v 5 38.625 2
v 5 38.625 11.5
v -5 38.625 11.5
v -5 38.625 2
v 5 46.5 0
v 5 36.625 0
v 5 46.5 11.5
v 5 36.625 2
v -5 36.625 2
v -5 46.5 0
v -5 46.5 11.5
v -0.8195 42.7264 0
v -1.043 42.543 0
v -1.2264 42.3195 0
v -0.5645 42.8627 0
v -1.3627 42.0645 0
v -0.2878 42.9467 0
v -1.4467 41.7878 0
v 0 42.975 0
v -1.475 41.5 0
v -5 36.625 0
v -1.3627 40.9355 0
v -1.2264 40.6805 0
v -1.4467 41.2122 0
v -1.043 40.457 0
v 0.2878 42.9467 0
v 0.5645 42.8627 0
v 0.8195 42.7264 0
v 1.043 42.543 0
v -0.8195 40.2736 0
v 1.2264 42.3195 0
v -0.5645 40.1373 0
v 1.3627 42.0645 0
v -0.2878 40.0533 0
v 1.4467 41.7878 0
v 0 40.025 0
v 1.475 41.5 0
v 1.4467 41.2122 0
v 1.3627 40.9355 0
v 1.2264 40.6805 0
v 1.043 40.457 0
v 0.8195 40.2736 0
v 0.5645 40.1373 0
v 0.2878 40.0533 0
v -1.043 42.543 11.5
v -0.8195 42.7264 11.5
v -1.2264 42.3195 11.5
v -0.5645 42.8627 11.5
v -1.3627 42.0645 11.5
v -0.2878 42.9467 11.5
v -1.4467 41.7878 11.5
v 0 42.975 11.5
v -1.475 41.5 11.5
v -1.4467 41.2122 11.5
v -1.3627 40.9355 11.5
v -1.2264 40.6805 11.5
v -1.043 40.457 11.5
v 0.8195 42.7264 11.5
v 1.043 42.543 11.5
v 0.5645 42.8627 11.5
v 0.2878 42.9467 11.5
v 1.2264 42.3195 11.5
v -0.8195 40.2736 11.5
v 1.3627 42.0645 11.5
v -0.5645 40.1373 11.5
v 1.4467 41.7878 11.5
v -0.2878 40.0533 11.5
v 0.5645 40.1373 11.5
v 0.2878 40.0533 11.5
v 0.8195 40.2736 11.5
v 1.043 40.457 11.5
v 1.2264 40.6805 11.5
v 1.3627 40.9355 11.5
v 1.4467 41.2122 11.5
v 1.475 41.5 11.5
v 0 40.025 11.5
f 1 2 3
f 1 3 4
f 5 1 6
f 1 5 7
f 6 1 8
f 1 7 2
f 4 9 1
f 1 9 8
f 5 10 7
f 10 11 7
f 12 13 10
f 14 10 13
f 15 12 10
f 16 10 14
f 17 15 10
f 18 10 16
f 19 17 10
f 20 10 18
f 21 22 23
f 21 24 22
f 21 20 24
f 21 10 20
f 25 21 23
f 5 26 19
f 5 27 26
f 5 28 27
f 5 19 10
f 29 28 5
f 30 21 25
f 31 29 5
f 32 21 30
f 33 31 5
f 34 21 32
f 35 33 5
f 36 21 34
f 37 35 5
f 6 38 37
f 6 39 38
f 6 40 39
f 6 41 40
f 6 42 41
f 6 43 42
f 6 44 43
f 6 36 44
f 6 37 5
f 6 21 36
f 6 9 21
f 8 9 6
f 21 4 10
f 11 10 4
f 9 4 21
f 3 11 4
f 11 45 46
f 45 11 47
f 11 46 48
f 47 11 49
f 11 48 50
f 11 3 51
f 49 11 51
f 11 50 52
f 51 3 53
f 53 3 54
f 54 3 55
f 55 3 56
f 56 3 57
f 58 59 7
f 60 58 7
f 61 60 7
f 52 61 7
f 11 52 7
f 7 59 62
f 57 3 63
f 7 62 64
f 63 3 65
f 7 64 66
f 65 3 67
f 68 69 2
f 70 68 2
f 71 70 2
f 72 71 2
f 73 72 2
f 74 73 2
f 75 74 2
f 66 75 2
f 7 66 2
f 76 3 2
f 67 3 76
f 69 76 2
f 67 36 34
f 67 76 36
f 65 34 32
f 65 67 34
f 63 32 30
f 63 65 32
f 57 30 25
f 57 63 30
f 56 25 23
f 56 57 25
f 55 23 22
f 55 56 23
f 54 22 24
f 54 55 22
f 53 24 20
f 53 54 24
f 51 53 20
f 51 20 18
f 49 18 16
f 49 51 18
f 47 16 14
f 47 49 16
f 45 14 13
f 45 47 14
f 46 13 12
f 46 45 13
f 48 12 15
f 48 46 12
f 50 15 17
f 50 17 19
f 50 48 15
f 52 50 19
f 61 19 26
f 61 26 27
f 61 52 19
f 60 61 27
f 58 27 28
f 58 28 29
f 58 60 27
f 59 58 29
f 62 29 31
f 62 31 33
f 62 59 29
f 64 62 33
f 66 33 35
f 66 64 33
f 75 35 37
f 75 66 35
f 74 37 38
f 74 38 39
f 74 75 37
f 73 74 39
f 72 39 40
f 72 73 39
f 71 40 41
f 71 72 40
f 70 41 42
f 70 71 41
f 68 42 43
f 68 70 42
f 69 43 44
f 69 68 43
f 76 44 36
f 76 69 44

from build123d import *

# Parameters (mm, degrees)
SKETCH1_W                    = 10
SKETCH1_H                    = 70
BOSS_EXTRUDE1_DEPTH          = 9.5
SKETCH2_W                    = 54.25
SKETCH2_H                    = 9.5
CUT_EXTRUDE1_DEPTH           = 38.619808612
SKETCH3_R                    = 1.475
CUT_EXTRUDE2_DEPTH           = 37.609425016
SKETCH4_W                    = 10
SKETCH4_H                    = 9.875
SKETCH4_R                    = 1.475
BOSS_EXTRUDE2_DEPTH          = 2
BODY_DELETE_KEEP_2_OUTLINE_W = 10
BODY_DELETE_KEEP_2_OUTLINE_H = 9.875
BODY_DELETE_KEEP_2_OUTLINE_R = 1.475
BODY_DELETE_KEEP_2_DEPTH     = 11.5
BODY_MOVE_COPY1_ANGLE        = 90


with BuildPart() as part:
    # Sketch1 → Boss-Extrude1 (new body)
    with BuildSketch(Plane(origin=(0, 0, 0), x_dir=(1, 0, 0), z_dir=(0, 1, 0))):
        Rectangle(SKETCH1_W, SKETCH1_H)
    extrude(amount=BOSS_EXTRUDE1_DEPTH)

    # Sketch2 → Cut-Extrude1 (cut, through all)
    with BuildSketch(Plane(origin=(5, 0, 0), x_dir=(0, 0, -1), z_dir=(1, 0, 0))):
        with Locations((0, 4.75)):
            Rectangle(SKETCH2_W, SKETCH2_H)
    extrude(amount=-CUT_EXTRUDE1_DEPTH, mode=Mode.SUBTRACT)


with BuildPart() as cut_extrude1_piece_1:
    # of the separate pieces the step leaves, piece 1, a body of its own (cut_extrude1_pieces)
    add(part.part.solids().sort_by_distance((-5, 0, 35))[0])


with BuildPart() as cut_extrude1_piece_2:
    # of the separate pieces the step leaves, piece 2, a body of its own (cut_extrude1_pieces)
    add(part.part.solids().sort_by_distance((-5, 0, -35))[0])


with BuildPart() as cut_extrude2_tool:
    # Sketch3 → Cut-Extrude2 (new, through all)
    with BuildSketch(Plane.XZ):
        with Locations(Location((0, 30, 0), (0, 0, 270))):
            Circle(SKETCH3_R)
        with Locations(Location((0, -30, 0), (0, 0, 270))):
            Circle(SKETCH3_R)
    extrude(amount=-CUT_EXTRUDE2_DEPTH)


with BuildPart() as cut_extrude1_piece_1_1:
    add(cut_extrude1_piece_1.part)

    # Cut-Extrude2: cut by cut_extrude2_tool
    add(cut_extrude2_tool.part, mode=Mode.SUBTRACT)



with BuildPart() as cut_extrude1_piece_2_1:
    add(cut_extrude1_piece_2.part)

    # Cut-Extrude2: cut by cut_extrude2_tool
    add(cut_extrude2_tool.part, mode=Mode.SUBTRACT)


with BuildPart() as cut_extrude1_piece_1_2:
    add(cut_extrude1_piece_1_1.part)

    add(cut_extrude1_piece_2_1.part)  # Boss-Extrude2 merges Cut-Extrude1 piece 2
    # Sketch4 → Boss-Extrude2 (add)
    # profile 1 of 2: a face of its own
    with BuildSketch(Plane(origin=(0, 9.5, 0), x_dir=(1, 0, 0), z_dir=(0, 1, 0))):
        with Locations((0, -30.0625)):
            Rectangle(SKETCH4_W, SKETCH4_H)
        with Locations(Location((0, -30, 0), (0, 0, 90))):
            Circle(SKETCH4_R, mode=Mode.SUBTRACT)
    # profile 2 of 2: a face of its own
    with BuildSketch(Plane(origin=(0, 9.5, 0), x_dir=(1, 0, 0), z_dir=(0, 1, 0))):
        with Locations((0, 30.0625)):
            Rectangle(SKETCH4_W, SKETCH4_H)
        with Locations(Location((0, 30, 0), (0, 0, 90))):
            Circle(SKETCH4_R, mode=Mode.SUBTRACT)
    extrude(amount=BOSS_EXTRUDE2_DEPTH)

    # Body-Delete/Keep 2: read off the stored shape, not the designer's step
    # Body-Delete/Keep 2 outline → Body-Delete/Keep 2 (cut)
    with BuildSketch(Plane(origin=(0, 0, 0), x_dir=(1, 0, 0), z_dir=(0, 1, 0))):
        with Locations((0, 30.0625)):
            Rectangle(BODY_DELETE_KEEP_2_OUTLINE_W, BODY_DELETE_KEEP_2_OUTLINE_H)
        with Locations((0, 30)):
            Circle(BODY_DELETE_KEEP_2_OUTLINE_R, mode=Mode.SUBTRACT)
    extrude(amount=BODY_DELETE_KEEP_2_DEPTH, mode=Mode.SUBTRACT)


with BuildPart() as cut_extrude1_piece_1_3:
    # Body-Move/Copy1: read off the stored shape, not the designer's step
    # Body-Move/Copy1: moved
    add(cut_extrude1_piece_1_2.part.moved(Location((0, -11.5, 11.5))).rotate(Axis((0, 0, 0), (-1, 0, 0)), BODY_MOVE_COPY1_ANGLE))


solid = cut_extrude1_piece_1_3.part
